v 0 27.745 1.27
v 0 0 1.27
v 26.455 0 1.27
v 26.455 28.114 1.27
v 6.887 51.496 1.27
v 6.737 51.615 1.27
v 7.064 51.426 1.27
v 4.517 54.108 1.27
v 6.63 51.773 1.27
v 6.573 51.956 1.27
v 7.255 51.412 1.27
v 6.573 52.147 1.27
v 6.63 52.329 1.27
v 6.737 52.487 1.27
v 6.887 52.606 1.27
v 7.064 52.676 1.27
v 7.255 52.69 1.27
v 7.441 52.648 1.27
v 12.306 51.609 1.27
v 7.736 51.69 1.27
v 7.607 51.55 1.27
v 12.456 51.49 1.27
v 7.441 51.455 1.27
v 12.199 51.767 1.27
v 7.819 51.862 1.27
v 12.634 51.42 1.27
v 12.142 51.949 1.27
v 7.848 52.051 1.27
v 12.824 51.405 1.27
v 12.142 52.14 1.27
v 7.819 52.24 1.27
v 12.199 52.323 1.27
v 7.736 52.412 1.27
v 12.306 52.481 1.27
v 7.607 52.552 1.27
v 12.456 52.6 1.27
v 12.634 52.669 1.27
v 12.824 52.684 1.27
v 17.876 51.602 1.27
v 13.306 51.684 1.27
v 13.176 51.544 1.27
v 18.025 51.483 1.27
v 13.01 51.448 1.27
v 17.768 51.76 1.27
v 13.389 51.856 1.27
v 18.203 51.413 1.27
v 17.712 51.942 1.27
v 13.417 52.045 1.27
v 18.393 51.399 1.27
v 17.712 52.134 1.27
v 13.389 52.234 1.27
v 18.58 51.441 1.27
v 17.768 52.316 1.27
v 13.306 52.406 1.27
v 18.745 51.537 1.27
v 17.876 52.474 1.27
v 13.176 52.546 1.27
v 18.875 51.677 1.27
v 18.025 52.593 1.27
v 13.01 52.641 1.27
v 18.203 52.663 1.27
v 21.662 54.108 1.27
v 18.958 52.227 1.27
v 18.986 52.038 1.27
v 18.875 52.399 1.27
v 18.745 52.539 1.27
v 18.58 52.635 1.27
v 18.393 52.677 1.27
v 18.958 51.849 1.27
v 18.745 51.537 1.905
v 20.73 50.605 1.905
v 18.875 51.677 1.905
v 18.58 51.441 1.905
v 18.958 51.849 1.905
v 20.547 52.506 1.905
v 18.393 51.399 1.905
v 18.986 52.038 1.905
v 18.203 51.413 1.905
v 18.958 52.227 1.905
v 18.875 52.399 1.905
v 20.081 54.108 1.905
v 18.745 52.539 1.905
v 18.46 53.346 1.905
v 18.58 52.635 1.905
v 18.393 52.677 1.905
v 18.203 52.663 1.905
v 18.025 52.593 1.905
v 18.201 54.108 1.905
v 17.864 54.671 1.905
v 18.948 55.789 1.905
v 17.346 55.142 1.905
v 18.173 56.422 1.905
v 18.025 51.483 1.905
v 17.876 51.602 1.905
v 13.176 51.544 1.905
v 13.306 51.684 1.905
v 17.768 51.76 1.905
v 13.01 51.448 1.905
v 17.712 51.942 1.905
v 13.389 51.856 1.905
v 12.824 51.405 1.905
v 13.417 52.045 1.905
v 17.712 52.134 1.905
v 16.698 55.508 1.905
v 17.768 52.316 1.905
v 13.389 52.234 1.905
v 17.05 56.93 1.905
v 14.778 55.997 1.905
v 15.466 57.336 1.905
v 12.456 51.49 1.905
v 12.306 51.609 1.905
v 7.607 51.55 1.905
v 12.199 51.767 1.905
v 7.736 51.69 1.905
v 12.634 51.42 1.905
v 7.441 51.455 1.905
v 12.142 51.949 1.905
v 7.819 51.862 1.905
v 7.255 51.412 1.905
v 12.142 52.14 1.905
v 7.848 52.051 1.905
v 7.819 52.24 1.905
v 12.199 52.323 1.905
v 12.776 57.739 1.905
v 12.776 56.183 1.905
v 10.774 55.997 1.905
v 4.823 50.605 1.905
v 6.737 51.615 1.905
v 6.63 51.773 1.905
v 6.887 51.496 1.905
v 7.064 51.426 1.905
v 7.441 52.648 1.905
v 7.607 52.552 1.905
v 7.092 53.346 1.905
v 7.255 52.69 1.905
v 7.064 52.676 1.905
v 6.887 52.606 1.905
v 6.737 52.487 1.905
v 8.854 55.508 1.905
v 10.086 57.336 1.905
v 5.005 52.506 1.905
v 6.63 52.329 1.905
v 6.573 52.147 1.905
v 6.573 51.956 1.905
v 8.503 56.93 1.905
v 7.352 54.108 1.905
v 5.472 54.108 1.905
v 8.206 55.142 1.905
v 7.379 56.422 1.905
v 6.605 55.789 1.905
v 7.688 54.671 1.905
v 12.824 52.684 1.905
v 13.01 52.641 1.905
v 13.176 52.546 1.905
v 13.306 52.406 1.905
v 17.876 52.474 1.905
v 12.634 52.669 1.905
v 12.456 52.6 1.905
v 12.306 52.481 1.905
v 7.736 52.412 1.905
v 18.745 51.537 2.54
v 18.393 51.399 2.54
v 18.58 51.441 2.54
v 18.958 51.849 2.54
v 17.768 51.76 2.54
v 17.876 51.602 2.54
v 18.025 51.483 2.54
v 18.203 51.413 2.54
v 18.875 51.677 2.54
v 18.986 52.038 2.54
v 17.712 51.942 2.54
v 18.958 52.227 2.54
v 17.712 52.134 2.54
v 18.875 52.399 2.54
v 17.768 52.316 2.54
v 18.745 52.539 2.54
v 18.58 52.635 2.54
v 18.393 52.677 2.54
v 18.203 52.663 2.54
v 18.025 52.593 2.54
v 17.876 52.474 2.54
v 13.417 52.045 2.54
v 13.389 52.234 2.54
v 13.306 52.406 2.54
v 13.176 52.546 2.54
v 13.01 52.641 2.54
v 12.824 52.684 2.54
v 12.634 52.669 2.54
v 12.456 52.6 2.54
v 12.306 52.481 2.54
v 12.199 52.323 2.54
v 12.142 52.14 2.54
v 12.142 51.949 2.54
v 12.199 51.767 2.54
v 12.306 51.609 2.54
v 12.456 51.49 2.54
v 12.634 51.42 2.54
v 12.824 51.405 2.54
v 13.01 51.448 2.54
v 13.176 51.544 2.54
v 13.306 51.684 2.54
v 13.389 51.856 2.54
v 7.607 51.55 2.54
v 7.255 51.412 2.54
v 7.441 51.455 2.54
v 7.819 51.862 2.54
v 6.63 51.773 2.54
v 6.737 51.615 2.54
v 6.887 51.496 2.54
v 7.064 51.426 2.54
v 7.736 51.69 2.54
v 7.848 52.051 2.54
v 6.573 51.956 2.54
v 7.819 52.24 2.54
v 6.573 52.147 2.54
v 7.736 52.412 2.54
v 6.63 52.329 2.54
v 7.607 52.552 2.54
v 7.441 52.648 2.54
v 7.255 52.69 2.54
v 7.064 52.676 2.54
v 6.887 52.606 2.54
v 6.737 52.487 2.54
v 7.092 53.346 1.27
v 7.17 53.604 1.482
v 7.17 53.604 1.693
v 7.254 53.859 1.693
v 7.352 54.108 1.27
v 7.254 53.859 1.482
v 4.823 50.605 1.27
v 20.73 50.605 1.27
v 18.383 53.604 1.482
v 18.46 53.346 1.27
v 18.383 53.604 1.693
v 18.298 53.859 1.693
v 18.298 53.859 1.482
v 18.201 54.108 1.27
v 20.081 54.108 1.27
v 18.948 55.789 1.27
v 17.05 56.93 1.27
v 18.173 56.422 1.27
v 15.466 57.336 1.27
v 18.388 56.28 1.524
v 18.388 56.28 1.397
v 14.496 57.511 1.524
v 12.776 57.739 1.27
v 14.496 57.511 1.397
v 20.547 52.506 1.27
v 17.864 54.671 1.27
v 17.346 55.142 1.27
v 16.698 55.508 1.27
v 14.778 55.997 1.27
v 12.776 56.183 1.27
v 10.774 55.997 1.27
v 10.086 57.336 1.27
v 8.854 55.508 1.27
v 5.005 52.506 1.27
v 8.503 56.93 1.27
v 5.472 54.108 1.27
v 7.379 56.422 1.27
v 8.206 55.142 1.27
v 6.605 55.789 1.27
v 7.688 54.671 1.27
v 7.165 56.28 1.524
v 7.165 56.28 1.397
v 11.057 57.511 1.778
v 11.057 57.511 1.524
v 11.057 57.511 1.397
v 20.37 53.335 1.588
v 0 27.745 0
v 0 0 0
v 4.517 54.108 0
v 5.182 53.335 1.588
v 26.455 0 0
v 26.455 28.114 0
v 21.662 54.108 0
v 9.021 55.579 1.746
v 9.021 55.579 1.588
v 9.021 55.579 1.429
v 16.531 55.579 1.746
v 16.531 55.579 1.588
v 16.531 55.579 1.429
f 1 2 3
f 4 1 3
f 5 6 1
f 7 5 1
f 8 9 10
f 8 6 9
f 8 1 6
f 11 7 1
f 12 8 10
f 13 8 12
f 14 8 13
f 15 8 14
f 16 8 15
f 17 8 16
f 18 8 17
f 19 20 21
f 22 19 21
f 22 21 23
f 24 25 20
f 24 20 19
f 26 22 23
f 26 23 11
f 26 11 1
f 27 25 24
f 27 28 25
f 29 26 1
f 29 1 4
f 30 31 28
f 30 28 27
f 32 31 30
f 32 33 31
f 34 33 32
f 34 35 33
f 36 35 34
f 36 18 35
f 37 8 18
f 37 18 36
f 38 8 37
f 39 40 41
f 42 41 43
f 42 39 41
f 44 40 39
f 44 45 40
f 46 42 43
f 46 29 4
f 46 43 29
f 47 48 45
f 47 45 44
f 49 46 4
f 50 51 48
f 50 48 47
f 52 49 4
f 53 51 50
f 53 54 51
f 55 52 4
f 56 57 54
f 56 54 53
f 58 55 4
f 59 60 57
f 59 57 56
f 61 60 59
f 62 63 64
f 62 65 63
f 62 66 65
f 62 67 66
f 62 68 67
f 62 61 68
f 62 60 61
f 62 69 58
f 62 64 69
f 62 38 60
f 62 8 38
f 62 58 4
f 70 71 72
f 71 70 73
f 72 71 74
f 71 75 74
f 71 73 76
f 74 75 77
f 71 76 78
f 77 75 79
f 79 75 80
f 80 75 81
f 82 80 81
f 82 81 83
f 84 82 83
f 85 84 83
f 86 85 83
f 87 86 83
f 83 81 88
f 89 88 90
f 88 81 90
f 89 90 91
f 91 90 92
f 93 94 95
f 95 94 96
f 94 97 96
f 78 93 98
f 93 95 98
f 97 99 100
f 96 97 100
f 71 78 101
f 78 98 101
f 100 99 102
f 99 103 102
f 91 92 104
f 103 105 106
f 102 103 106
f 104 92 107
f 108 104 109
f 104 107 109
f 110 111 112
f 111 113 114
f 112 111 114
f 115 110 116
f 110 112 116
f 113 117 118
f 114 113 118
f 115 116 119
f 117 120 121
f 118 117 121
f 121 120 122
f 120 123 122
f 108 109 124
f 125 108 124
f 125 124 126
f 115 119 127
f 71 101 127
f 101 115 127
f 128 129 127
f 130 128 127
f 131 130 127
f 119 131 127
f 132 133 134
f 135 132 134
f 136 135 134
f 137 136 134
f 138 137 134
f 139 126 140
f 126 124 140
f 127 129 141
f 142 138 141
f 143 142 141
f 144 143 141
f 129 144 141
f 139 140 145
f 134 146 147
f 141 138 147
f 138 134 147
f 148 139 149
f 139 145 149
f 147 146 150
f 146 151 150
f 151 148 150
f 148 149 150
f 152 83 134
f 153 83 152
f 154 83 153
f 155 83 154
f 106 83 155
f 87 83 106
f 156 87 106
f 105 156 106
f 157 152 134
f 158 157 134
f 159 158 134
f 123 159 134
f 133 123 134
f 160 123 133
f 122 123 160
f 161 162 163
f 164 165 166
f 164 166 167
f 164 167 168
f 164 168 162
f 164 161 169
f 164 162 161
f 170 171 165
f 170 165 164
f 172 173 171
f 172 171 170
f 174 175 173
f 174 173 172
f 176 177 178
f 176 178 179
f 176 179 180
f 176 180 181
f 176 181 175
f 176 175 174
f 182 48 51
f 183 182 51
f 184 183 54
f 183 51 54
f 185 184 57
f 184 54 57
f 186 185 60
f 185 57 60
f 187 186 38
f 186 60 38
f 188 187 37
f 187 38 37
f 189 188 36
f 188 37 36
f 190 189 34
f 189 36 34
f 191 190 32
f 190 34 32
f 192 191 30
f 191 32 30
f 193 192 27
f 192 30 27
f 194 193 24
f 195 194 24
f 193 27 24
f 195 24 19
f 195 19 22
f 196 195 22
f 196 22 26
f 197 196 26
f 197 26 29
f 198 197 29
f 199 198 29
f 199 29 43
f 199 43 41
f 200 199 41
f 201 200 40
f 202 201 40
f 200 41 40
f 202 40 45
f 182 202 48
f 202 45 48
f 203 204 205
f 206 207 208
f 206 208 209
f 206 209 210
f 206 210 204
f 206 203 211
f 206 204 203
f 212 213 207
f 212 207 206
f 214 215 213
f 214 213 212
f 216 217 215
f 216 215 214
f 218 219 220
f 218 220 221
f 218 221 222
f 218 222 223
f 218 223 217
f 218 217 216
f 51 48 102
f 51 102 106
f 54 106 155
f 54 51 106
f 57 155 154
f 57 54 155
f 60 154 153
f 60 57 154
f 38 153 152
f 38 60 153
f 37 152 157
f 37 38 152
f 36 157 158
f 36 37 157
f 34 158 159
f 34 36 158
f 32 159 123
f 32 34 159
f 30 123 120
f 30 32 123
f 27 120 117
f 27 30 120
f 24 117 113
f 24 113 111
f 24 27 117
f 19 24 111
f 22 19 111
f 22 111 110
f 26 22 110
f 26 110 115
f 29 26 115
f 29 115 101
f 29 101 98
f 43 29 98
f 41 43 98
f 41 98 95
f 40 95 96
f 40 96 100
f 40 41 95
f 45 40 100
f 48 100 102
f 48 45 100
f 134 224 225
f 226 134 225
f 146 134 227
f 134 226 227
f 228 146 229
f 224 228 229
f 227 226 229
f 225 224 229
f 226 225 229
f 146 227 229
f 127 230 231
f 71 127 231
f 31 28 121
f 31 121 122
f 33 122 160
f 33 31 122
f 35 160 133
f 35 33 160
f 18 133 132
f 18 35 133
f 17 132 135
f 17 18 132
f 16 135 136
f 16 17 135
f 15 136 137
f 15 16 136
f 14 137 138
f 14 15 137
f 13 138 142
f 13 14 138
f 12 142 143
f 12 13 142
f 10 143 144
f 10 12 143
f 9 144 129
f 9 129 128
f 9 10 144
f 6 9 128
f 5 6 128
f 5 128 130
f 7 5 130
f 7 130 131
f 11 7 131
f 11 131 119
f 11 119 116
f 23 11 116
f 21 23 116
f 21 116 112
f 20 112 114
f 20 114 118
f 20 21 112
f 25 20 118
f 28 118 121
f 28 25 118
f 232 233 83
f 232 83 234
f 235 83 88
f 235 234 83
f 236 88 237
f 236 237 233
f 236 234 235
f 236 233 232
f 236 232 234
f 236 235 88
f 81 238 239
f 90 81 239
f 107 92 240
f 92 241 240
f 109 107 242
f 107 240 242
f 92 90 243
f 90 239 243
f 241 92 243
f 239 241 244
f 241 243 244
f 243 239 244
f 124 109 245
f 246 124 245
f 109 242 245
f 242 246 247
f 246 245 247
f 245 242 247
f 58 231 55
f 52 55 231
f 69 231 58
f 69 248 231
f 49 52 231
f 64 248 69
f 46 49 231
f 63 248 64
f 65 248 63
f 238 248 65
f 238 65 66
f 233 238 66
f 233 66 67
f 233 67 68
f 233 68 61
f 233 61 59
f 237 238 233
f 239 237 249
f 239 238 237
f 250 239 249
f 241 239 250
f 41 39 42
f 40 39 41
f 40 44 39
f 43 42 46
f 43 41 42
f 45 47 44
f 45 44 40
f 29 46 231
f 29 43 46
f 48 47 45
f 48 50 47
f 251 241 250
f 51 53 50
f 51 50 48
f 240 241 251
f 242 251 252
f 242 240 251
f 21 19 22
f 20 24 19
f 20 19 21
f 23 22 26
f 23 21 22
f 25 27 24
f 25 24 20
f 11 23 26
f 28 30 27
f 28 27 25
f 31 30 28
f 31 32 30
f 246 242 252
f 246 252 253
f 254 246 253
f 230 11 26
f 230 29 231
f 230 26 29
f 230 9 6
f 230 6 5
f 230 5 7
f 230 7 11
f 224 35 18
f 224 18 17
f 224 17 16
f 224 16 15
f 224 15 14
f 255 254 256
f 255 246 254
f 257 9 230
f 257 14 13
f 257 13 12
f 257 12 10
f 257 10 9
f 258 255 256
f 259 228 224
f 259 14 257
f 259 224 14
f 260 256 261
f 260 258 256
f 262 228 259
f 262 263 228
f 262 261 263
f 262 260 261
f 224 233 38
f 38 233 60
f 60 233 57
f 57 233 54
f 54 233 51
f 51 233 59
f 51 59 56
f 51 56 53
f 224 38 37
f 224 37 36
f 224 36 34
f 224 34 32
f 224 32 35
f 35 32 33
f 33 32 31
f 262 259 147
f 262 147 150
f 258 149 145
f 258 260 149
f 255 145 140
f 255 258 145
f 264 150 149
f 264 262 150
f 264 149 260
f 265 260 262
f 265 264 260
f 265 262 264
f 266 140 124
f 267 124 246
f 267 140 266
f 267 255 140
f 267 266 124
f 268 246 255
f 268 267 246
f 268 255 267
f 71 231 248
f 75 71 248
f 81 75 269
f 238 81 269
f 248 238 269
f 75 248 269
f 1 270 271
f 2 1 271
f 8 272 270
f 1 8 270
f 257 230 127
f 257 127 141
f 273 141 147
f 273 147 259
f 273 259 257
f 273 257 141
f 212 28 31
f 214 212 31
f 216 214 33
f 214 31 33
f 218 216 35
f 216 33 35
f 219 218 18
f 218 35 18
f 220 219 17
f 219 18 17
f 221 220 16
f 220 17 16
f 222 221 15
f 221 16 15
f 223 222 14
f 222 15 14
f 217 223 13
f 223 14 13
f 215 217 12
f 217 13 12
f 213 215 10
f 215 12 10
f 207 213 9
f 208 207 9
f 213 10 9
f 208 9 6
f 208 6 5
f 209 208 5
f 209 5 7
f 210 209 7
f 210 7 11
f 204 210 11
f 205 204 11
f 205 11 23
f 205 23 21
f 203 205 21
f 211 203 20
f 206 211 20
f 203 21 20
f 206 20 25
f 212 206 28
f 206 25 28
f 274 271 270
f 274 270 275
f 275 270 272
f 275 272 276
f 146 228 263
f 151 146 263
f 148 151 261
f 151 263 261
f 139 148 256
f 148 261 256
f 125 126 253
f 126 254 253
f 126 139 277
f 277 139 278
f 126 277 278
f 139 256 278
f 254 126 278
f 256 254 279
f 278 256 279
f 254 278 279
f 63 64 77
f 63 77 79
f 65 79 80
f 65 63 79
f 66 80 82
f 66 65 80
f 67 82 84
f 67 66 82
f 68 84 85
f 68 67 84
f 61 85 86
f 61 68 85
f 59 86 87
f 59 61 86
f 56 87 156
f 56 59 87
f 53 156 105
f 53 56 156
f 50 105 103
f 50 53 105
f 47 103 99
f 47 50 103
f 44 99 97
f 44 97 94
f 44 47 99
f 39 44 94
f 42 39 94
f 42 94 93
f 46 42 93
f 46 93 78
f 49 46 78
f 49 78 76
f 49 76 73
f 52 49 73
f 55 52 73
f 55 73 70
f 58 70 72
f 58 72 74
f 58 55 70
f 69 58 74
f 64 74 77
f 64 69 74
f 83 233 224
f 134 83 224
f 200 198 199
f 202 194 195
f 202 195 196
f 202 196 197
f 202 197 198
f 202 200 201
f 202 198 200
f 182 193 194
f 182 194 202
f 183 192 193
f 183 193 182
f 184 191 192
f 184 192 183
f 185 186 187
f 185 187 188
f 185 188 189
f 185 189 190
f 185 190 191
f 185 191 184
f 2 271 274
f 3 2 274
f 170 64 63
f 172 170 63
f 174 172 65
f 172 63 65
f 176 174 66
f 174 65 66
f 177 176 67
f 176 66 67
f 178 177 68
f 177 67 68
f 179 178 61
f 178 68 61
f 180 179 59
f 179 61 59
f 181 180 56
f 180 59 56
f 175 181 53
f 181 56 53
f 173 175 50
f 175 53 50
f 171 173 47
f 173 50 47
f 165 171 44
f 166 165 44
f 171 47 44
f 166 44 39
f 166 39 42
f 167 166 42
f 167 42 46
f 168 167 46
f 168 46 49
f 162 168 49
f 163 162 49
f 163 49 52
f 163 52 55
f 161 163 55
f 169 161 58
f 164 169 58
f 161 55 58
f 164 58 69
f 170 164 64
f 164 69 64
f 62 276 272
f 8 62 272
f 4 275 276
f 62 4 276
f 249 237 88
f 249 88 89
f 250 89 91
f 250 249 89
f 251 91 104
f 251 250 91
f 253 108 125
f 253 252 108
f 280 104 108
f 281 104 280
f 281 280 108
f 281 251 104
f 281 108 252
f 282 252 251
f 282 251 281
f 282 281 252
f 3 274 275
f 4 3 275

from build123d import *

# Parameters (mm, degrees)
F1_DEPTH = 1.27
F2_R     = 0.6409039012
F3_DEPTH = 1.27
F4_R     = 0.6409039012
F5_DEPTH = 0.635


with BuildPart() as f1:
    # F0 (on Top) → F1 (new body)
    with BuildSketch(Plane.XY):
        Polygon((4.5166932978, 54.1081428528), (0, 27.7454033494), (0, 0), (26.4549218118, 0), (26.4549218118, 28.1141139567), (21.6616950929, 54.1081428528), align=None)
    extrude(amount=F1_DEPTH)

    # F2 (on face) → F3 (join)
    with BuildSketch(Plane.XY.offset(1.27)):
        with Locations((7.2069587186, 52.051179111)):
            Circle(F2_R)
        with Locations((12.7762, 52.0446)):
            Circle(F2_R)
        with Locations((18.3454412814, 52.038020889)):
            Circle(F2_R)
    extrude(amount=F3_DEPTH)


with BuildPart() as f5:
    # F4 (on face) → F5 (new body)
    with BuildSketch(Plane.XY.offset(1.27)):
        with BuildLine():
            add(Edge.make_bspline(
                [(4.8227427374, 50.6045743823), (4.8876676433, 51.57466059), (4.9779603593, 52.8723637447), (5.3592032539, 53.8670811307), (5.4717375273, 54.1081428528)],
                knots=[0, 0, 0, 0, 0.1948044361, 0.262338147, 0.262338147, 0.262338147, 0.262338147], degree=3))
            Line((4.8227427374, 50.6045743823), (20.7296572626, 50.6045743823))
            add(Edge.make_bspline(
                [(20.7296572626, 50.6045743823), (20.6647323567, 51.57466059), (20.5744396407, 52.8723637447), (20.1931967461, 53.8670811307), (20.0806624727, 54.1081428528)],
                knots=[0, 0, 0, 0, 0.1948044361, 0.262338147, 0.262338147, 0.262338147, 0.262338147], degree=3))
            Line((20.0806624727, 54.1081428528), (18.2008306329, 54.1081428528))
            add(Edge.make_bspline(
                [(18.4601201523, 53.3456727862), (18.3838005475, 53.6044409864), (18.3074809427, 53.8632091865), (18.2008306329, 54.1081428528)],
                knots=[0, 0, 0, 0, 0.1299634207, 0.1299634207, 0.1299634207, 0.1299634207], degree=3))
            Line((18.4601201523, 53.3456727862), (12.7762, 53.3456727862))
            Line((12.7762, 53.3456727862), (7.0922798477, 53.3456727862))
            add(Edge.make_bspline(
                [(7.0922798477, 53.3456727862), (7.1685994525, 53.6044409864), (7.2449190573, 53.8632091865), (7.3515693671, 54.1081428528)],
                knots=[0, 0, 0, 0, 0.1299634207, 0.1299634207, 0.1299634207, 0.1299634207], degree=3))
            Line((7.3515693671, 54.1081428528), (5.4717375273, 54.1081428528))
        make_face()
        with Locations((7.2069587186, 52.051179111)):
            Circle(F4_R, mode=Mode.SUBTRACT)
        with Locations((12.7762, 52.0446)):
            Circle(F4_R, mode=Mode.SUBTRACT)
        with Locations((18.3454412814, 52.038020889)):
            Circle(F4_R, mode=Mode.SUBTRACT)
        with BuildLine():
            add(Edge.make_bspline(
                [(5.4717375273, 54.1081428528), (5.6289039905, 54.4448120036), (6.1137426448, 55.2493900595), (7.0873471955, 56.4104167137), (8.9314876501, 57.1332297998), (11.0322335818, 57.517239989), (12.2415750936, 57.6998275416), (12.7762, 57.738583535)],
                knots=[0.262338147, 0.262338147, 0.262338147, 0.262338147, 0.3566563861, 0.50920742, 0.6725861947, 0.8453952027, 1, 1, 1, 1], degree=3))
            Line((5.4717375273, 54.1081428528), (7.3515693671, 54.1081428528))
            add(Edge.make_bspline(
                [(7.3515693671, 54.1081428528), (7.4296103827, 54.2873722627), (7.7691891934, 54.9062304462), (9.0125467827, 55.7048152887), (10.8559336302, 56.0423099147), (12.1333636483, 56.1356138926), (12.7762, 56.182566906)],
                knots=[0.1299634207, 0.1299634207, 0.1299634207, 0.1299634207, 0.2250637291, 0.4724906838, 0.7345434509, 1, 1, 1, 1], degree=3))
            add(Edge.make_bspline(
                [(18.2008306329, 54.1081428528), (18.1227896173, 54.2873722627), (17.7832108066, 54.9062304462), (16.5398532173, 55.7048152887), (14.6964663698, 56.0423099147), (13.4190363517, 56.1356138926), (12.7762, 56.182566906)],
                knots=[0.1299634207, 0.1299634207, 0.1299634207, 0.1299634207, 0.2250637291, 0.4724906838, 0.7345434509, 1, 1, 1, 1], degree=3))
            Line((18.2008306329, 54.1081428528), (20.0806624727, 54.1081428528))
            add(Edge.make_bspline(
                [(20.0806624727, 54.1081428528), (19.9234960095, 54.4448120036), (19.4386573552, 55.2493900595), (18.4650528045, 56.4104167137), (16.6209123499, 57.1332297998), (14.5201664182, 57.517239989), (13.3108249064, 57.6998275416), (12.7762, 57.738583535)],
                knots=[0.262338147, 0.262338147, 0.262338147, 0.262338147, 0.3566563861, 0.50920742, 0.6725861947, 0.8453952027, 1, 1, 1, 1], degree=3))
        make_face()
    extrude(amount=F5_DEPTH)


solid = Compound([f1.part, f5.part])
